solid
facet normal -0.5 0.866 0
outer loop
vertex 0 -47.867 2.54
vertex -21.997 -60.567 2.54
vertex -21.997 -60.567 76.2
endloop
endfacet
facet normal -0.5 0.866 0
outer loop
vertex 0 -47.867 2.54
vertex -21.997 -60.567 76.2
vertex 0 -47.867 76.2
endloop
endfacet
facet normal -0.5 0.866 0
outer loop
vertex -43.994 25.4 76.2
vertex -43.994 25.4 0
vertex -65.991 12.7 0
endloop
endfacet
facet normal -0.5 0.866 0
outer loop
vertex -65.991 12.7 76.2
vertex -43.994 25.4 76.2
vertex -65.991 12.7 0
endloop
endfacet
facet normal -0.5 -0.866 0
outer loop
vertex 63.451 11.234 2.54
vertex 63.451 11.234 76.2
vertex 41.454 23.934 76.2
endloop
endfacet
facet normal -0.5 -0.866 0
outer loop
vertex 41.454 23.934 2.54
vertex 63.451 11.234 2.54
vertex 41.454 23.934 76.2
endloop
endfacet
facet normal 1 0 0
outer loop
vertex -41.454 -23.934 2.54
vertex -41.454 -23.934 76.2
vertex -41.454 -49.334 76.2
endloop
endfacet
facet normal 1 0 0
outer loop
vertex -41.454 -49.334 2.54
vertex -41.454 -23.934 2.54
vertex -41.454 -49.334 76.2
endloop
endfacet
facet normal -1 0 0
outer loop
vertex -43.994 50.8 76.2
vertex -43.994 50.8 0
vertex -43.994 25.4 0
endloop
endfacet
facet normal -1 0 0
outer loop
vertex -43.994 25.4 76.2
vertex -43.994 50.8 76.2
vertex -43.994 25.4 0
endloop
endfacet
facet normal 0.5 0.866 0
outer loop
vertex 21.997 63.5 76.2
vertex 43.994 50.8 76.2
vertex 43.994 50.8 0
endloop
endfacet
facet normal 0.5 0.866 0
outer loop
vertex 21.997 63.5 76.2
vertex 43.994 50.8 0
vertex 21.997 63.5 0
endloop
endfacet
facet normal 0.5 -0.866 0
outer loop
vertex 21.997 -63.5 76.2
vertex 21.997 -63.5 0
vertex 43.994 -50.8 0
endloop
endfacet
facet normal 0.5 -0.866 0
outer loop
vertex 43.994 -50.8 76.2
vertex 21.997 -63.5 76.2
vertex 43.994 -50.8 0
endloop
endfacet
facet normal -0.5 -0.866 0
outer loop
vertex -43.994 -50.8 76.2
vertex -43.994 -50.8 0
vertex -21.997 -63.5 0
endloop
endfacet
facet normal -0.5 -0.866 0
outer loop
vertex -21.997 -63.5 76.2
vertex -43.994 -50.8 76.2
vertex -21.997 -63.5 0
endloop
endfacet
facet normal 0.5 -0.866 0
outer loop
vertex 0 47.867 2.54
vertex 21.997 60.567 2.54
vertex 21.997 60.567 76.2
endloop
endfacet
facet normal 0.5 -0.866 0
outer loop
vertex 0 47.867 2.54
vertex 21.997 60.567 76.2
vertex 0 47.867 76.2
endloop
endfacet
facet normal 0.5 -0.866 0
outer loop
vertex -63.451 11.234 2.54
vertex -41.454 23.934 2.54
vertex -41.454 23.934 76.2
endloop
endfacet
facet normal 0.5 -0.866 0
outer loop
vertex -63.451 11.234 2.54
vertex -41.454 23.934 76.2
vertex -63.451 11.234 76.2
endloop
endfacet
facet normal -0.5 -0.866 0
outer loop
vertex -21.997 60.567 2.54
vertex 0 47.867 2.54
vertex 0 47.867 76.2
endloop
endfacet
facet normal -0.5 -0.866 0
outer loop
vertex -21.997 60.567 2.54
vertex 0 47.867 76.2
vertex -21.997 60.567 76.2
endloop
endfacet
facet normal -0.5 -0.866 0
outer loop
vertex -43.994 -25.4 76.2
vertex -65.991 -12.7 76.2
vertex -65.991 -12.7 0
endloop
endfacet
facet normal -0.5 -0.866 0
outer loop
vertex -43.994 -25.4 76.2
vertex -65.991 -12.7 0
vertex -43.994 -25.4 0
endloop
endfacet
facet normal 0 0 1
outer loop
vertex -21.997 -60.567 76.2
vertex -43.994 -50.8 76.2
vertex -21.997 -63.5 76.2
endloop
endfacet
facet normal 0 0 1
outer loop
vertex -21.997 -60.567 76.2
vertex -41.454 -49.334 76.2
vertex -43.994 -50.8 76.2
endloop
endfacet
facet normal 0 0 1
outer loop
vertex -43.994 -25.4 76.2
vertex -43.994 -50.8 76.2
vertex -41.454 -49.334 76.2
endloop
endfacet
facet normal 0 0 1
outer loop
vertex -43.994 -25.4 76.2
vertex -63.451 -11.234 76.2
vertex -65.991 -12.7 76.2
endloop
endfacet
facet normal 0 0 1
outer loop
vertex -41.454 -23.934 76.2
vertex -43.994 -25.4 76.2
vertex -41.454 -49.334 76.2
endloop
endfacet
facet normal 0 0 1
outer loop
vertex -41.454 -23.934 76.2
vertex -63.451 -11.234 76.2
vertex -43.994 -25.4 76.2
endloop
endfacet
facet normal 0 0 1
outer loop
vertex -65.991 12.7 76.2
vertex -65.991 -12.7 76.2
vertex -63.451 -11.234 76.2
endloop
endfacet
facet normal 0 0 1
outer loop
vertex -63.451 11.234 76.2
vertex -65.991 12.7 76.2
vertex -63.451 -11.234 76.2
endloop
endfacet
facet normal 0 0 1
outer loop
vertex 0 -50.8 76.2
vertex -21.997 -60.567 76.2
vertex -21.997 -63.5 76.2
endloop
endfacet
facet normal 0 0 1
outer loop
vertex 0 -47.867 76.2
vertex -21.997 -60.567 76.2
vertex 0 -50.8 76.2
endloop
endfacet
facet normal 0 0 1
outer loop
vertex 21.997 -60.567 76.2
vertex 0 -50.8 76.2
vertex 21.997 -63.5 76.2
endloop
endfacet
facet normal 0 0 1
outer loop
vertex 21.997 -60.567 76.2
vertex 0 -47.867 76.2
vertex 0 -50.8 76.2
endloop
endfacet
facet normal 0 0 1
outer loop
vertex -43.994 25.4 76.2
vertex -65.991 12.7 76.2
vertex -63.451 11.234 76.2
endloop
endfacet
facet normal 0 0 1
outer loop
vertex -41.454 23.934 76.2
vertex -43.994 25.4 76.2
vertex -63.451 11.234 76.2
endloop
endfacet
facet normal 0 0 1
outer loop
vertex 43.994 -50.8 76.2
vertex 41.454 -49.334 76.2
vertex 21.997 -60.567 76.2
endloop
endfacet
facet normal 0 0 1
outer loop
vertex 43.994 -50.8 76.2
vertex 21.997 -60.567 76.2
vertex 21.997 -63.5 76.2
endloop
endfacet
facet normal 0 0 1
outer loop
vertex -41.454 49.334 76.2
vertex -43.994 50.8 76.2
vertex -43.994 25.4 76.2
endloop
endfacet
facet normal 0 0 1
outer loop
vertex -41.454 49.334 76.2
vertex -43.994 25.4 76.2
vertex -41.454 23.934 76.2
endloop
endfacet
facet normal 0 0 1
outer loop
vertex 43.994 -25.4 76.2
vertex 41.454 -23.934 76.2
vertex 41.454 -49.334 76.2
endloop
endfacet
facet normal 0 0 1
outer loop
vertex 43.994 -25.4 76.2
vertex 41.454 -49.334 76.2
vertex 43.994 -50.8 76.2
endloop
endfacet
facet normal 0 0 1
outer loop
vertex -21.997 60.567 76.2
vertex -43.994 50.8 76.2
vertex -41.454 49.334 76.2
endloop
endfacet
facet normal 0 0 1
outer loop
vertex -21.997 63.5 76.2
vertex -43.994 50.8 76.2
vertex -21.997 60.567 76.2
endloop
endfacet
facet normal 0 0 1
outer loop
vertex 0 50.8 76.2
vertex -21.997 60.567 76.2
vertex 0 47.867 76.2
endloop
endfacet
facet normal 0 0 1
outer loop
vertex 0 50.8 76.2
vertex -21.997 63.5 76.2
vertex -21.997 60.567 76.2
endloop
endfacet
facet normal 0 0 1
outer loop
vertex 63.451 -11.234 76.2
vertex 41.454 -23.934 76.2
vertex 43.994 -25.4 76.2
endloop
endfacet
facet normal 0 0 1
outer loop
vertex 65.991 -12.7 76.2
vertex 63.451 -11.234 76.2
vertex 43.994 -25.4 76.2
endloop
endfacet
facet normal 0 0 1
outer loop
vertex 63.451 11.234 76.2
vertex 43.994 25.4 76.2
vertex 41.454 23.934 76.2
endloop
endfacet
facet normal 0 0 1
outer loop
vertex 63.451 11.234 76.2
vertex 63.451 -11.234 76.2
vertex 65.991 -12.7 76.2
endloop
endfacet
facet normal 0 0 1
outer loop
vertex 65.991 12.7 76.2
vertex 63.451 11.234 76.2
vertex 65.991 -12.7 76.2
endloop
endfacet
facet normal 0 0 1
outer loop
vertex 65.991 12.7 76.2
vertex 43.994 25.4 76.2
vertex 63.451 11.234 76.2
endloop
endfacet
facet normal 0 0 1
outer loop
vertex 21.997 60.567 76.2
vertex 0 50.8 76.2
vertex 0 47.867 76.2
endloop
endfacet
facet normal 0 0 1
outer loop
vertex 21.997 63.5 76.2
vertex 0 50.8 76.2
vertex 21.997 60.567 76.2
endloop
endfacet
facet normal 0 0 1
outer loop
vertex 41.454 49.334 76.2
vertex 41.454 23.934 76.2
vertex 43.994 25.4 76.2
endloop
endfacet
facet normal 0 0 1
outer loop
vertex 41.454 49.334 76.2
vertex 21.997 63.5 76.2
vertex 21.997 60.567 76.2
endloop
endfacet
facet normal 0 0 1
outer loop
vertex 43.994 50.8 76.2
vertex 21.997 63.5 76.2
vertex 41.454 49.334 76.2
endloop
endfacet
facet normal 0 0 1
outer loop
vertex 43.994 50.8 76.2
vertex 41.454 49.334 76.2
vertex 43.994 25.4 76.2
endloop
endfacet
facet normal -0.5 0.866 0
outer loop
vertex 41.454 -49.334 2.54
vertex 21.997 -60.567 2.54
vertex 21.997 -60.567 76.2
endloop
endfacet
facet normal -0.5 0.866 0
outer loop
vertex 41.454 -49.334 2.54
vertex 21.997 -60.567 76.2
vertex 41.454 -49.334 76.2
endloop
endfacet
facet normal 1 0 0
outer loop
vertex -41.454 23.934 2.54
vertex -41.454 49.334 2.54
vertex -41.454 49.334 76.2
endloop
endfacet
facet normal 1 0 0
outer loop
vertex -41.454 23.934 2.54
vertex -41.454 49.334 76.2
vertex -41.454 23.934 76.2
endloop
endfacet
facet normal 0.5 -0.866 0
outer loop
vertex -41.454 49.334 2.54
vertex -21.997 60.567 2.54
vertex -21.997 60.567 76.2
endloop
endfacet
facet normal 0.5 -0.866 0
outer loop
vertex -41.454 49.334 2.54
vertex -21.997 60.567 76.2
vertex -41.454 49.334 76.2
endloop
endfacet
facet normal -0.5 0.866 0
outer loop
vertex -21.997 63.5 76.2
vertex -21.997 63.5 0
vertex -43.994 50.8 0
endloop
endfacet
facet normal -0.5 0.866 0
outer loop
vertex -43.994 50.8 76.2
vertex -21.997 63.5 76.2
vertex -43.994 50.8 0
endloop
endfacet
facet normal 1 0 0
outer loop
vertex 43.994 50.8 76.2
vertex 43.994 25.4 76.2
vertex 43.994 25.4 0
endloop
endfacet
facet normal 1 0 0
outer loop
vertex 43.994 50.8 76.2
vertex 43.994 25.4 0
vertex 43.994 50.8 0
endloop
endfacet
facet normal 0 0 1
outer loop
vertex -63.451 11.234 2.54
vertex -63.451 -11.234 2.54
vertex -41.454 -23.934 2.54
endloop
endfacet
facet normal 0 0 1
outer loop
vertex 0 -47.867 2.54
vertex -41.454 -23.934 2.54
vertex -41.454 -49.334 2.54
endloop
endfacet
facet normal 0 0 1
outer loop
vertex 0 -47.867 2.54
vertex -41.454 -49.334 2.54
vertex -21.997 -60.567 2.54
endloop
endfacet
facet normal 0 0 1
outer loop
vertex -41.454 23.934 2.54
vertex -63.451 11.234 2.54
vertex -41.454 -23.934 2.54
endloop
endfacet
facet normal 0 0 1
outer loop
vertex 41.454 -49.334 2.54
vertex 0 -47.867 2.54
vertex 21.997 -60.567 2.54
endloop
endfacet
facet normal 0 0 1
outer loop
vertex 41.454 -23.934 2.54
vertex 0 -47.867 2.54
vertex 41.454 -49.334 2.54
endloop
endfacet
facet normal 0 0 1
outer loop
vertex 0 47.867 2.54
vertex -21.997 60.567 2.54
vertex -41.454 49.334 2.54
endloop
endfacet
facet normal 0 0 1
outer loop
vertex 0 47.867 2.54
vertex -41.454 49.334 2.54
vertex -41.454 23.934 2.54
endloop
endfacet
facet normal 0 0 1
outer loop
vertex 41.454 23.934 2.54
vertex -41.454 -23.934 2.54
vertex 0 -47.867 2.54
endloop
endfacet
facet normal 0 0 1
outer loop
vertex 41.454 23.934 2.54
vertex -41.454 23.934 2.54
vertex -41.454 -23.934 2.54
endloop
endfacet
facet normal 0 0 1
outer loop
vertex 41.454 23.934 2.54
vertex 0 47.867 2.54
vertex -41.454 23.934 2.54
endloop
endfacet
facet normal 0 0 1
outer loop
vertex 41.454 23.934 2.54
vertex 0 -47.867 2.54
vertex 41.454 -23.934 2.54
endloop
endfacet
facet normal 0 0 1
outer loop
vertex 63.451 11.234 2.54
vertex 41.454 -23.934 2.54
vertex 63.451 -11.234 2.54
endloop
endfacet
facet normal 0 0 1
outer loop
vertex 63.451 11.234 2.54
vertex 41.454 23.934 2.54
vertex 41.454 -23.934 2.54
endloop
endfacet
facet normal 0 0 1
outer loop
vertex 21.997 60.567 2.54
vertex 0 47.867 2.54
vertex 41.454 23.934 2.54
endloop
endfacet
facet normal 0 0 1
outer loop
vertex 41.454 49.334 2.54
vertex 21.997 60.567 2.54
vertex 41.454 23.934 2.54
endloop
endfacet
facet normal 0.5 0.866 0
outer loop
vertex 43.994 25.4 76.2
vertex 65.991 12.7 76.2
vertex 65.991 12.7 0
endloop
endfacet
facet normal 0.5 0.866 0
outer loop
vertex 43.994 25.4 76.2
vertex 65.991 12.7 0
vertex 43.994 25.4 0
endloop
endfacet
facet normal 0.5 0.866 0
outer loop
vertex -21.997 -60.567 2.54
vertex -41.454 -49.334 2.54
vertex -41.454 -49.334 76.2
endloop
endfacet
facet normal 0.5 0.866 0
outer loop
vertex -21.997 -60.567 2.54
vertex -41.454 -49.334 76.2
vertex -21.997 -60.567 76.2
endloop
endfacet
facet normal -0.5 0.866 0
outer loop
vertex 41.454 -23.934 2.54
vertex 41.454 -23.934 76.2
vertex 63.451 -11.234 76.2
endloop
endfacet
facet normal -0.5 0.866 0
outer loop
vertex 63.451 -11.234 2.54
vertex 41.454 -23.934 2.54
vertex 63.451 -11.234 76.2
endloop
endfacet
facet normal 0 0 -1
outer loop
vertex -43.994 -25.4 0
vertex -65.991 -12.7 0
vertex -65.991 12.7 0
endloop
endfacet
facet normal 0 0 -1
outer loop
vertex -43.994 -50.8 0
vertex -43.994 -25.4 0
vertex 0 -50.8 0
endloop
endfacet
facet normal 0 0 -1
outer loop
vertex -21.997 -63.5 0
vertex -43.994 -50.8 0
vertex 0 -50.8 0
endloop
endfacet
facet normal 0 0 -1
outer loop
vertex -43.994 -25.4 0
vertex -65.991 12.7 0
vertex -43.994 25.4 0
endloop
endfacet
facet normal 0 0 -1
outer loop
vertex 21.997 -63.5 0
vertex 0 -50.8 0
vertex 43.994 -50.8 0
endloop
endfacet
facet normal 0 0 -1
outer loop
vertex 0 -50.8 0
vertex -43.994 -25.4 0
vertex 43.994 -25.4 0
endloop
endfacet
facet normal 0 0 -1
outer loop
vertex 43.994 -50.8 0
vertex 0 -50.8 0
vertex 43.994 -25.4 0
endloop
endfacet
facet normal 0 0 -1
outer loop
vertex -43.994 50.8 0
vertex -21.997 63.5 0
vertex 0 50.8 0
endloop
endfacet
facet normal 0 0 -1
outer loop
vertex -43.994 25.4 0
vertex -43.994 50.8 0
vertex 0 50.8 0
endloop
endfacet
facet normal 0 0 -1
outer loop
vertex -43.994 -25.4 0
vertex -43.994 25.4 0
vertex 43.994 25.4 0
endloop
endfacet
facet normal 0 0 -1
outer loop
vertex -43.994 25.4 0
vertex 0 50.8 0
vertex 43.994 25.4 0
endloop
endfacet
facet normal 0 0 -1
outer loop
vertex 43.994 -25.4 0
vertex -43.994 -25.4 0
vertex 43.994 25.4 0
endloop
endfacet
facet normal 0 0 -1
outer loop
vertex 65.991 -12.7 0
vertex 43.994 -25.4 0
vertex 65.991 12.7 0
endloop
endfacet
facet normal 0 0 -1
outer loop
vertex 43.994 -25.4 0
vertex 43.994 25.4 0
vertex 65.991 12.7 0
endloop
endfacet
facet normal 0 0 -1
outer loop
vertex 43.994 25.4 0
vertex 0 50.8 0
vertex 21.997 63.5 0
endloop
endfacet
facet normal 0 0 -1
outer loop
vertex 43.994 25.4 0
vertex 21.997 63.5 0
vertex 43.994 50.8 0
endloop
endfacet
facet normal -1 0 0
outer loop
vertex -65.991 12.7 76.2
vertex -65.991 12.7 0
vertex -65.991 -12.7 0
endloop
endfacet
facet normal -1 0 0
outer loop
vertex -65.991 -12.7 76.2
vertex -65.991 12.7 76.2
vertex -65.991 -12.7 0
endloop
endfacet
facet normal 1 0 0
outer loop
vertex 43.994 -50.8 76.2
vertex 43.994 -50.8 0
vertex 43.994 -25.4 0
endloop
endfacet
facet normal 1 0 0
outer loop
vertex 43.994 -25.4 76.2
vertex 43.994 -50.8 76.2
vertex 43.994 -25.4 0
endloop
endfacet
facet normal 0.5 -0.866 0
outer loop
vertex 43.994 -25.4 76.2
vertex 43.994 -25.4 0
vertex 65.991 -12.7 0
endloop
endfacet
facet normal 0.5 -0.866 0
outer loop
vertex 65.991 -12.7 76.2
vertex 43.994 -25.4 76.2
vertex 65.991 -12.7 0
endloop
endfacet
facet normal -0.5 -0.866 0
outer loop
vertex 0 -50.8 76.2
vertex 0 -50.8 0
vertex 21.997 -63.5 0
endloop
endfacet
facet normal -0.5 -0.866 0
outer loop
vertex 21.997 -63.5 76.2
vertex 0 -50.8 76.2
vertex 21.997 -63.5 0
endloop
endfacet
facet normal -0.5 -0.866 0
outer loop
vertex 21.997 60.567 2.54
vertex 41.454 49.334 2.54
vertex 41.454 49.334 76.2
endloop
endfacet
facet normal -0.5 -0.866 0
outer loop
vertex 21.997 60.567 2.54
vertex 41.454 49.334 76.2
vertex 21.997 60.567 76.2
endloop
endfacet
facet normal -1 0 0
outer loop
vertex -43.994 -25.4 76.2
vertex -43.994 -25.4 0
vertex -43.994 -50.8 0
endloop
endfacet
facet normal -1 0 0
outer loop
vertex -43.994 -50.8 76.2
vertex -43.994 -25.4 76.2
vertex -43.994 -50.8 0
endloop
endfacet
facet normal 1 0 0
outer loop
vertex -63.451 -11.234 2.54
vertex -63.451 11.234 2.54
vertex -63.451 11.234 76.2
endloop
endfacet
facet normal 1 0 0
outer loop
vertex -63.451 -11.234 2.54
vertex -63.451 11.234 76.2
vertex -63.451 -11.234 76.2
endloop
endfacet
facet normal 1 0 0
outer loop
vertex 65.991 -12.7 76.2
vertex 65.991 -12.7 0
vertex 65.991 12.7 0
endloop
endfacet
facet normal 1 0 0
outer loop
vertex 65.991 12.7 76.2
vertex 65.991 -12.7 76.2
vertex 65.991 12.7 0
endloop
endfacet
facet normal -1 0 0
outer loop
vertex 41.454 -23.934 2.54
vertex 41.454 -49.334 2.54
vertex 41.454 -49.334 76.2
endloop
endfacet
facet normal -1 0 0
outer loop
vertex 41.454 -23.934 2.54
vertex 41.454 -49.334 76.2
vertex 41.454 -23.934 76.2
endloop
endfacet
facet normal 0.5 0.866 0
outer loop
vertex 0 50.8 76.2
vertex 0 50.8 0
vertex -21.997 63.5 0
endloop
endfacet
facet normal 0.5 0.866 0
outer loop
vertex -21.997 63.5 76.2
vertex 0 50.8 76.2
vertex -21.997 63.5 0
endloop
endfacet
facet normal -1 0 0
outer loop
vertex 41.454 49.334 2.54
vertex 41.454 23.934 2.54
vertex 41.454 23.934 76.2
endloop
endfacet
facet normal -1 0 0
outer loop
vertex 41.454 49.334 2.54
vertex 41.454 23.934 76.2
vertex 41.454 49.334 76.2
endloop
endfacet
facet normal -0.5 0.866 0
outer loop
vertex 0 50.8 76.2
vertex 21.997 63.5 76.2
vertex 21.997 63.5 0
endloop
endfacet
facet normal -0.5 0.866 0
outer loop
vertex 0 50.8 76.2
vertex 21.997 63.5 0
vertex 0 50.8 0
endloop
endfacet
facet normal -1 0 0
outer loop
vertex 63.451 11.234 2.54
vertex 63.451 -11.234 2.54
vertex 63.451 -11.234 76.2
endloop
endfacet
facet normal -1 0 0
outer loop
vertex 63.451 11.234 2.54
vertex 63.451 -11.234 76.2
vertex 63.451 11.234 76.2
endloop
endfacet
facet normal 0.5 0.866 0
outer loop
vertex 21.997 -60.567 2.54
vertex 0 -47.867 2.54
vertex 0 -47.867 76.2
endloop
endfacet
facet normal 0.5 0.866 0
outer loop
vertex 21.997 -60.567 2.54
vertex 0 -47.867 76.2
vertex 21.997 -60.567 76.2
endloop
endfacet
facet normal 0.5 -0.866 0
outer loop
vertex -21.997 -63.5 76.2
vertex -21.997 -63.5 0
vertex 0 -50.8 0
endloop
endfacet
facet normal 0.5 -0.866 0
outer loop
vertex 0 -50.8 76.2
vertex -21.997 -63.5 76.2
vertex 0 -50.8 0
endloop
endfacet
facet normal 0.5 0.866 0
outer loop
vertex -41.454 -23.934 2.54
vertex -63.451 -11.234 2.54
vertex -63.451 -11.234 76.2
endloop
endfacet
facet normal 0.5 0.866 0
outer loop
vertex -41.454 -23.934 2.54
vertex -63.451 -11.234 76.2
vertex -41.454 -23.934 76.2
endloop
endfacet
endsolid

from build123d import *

# Parameters (mm, degrees)
F1_DEPTH = 76.2
F2_T     = -2.54


with BuildPart() as f1:
    # F0 (on Top) → F1 (new body)
    with BuildSketch(Plane.XY):
        Polygon((43.9940905122, 25.4), (21.9970452561, 12.7), (21.9970452561, -12.7), (43.9940905122, -25.4), (65.9911357684, -12.7), (65.9911357684, 12.7), align=None)
        Polygon((0, 25.4), (21.9970452561, 12.7), (43.9940905122, 25.4), (43.994090537, 50.8000000143), (21.9970452561, 63.5000000285), (-2.47e-08, 50.8000000143), align=None)
        Polygon((43.9940905122, -25.4), (21.9970452561, -12.7), (0, -25.4), (0, -50.8), (21.9970452561, -63.5), (43.9940905122, -50.8), align=None)
        Polygon((-21.9970452561, 12.7), (0, 25.4), (0, 50.8), (-21.9970452561, 63.5), (-43.9940905122, 50.8), (-43.9940905122, 25.4), align=None)
        Polygon((0, -50.8), (0, -25.4), (-21.9970452561, -12.7), (-43.9940905122, -25.4), (-43.9940905122, -50.8), (-21.9970452561, -63.5), align=None)
        Polygon((-21.9970452561, -12.7), (-21.9970452561, 12.7), (-43.9940905122, 25.4), (-65.9911357684, 12.7), (-65.9911357684, -12.7), (-43.9940905122, -25.4), align=None)
        Polygon((21.9970452561, -12.7), (21.9970452561, 12.7), (0, 25.4), (-21.9970452561, 12.7), (-21.9970452561, -12.7), (0, -25.4), align=None)
    extrude(amount=F1_DEPTH)

    # F2
    f2_openings = [f1.faces().sort_by_distance(p)[0] for p in [
        (0, 0, 76.2),
    ]]
    offset(amount=F2_T, openings=f2_openings, kind=Kind.INTERSECTION)


solid = f1.part
